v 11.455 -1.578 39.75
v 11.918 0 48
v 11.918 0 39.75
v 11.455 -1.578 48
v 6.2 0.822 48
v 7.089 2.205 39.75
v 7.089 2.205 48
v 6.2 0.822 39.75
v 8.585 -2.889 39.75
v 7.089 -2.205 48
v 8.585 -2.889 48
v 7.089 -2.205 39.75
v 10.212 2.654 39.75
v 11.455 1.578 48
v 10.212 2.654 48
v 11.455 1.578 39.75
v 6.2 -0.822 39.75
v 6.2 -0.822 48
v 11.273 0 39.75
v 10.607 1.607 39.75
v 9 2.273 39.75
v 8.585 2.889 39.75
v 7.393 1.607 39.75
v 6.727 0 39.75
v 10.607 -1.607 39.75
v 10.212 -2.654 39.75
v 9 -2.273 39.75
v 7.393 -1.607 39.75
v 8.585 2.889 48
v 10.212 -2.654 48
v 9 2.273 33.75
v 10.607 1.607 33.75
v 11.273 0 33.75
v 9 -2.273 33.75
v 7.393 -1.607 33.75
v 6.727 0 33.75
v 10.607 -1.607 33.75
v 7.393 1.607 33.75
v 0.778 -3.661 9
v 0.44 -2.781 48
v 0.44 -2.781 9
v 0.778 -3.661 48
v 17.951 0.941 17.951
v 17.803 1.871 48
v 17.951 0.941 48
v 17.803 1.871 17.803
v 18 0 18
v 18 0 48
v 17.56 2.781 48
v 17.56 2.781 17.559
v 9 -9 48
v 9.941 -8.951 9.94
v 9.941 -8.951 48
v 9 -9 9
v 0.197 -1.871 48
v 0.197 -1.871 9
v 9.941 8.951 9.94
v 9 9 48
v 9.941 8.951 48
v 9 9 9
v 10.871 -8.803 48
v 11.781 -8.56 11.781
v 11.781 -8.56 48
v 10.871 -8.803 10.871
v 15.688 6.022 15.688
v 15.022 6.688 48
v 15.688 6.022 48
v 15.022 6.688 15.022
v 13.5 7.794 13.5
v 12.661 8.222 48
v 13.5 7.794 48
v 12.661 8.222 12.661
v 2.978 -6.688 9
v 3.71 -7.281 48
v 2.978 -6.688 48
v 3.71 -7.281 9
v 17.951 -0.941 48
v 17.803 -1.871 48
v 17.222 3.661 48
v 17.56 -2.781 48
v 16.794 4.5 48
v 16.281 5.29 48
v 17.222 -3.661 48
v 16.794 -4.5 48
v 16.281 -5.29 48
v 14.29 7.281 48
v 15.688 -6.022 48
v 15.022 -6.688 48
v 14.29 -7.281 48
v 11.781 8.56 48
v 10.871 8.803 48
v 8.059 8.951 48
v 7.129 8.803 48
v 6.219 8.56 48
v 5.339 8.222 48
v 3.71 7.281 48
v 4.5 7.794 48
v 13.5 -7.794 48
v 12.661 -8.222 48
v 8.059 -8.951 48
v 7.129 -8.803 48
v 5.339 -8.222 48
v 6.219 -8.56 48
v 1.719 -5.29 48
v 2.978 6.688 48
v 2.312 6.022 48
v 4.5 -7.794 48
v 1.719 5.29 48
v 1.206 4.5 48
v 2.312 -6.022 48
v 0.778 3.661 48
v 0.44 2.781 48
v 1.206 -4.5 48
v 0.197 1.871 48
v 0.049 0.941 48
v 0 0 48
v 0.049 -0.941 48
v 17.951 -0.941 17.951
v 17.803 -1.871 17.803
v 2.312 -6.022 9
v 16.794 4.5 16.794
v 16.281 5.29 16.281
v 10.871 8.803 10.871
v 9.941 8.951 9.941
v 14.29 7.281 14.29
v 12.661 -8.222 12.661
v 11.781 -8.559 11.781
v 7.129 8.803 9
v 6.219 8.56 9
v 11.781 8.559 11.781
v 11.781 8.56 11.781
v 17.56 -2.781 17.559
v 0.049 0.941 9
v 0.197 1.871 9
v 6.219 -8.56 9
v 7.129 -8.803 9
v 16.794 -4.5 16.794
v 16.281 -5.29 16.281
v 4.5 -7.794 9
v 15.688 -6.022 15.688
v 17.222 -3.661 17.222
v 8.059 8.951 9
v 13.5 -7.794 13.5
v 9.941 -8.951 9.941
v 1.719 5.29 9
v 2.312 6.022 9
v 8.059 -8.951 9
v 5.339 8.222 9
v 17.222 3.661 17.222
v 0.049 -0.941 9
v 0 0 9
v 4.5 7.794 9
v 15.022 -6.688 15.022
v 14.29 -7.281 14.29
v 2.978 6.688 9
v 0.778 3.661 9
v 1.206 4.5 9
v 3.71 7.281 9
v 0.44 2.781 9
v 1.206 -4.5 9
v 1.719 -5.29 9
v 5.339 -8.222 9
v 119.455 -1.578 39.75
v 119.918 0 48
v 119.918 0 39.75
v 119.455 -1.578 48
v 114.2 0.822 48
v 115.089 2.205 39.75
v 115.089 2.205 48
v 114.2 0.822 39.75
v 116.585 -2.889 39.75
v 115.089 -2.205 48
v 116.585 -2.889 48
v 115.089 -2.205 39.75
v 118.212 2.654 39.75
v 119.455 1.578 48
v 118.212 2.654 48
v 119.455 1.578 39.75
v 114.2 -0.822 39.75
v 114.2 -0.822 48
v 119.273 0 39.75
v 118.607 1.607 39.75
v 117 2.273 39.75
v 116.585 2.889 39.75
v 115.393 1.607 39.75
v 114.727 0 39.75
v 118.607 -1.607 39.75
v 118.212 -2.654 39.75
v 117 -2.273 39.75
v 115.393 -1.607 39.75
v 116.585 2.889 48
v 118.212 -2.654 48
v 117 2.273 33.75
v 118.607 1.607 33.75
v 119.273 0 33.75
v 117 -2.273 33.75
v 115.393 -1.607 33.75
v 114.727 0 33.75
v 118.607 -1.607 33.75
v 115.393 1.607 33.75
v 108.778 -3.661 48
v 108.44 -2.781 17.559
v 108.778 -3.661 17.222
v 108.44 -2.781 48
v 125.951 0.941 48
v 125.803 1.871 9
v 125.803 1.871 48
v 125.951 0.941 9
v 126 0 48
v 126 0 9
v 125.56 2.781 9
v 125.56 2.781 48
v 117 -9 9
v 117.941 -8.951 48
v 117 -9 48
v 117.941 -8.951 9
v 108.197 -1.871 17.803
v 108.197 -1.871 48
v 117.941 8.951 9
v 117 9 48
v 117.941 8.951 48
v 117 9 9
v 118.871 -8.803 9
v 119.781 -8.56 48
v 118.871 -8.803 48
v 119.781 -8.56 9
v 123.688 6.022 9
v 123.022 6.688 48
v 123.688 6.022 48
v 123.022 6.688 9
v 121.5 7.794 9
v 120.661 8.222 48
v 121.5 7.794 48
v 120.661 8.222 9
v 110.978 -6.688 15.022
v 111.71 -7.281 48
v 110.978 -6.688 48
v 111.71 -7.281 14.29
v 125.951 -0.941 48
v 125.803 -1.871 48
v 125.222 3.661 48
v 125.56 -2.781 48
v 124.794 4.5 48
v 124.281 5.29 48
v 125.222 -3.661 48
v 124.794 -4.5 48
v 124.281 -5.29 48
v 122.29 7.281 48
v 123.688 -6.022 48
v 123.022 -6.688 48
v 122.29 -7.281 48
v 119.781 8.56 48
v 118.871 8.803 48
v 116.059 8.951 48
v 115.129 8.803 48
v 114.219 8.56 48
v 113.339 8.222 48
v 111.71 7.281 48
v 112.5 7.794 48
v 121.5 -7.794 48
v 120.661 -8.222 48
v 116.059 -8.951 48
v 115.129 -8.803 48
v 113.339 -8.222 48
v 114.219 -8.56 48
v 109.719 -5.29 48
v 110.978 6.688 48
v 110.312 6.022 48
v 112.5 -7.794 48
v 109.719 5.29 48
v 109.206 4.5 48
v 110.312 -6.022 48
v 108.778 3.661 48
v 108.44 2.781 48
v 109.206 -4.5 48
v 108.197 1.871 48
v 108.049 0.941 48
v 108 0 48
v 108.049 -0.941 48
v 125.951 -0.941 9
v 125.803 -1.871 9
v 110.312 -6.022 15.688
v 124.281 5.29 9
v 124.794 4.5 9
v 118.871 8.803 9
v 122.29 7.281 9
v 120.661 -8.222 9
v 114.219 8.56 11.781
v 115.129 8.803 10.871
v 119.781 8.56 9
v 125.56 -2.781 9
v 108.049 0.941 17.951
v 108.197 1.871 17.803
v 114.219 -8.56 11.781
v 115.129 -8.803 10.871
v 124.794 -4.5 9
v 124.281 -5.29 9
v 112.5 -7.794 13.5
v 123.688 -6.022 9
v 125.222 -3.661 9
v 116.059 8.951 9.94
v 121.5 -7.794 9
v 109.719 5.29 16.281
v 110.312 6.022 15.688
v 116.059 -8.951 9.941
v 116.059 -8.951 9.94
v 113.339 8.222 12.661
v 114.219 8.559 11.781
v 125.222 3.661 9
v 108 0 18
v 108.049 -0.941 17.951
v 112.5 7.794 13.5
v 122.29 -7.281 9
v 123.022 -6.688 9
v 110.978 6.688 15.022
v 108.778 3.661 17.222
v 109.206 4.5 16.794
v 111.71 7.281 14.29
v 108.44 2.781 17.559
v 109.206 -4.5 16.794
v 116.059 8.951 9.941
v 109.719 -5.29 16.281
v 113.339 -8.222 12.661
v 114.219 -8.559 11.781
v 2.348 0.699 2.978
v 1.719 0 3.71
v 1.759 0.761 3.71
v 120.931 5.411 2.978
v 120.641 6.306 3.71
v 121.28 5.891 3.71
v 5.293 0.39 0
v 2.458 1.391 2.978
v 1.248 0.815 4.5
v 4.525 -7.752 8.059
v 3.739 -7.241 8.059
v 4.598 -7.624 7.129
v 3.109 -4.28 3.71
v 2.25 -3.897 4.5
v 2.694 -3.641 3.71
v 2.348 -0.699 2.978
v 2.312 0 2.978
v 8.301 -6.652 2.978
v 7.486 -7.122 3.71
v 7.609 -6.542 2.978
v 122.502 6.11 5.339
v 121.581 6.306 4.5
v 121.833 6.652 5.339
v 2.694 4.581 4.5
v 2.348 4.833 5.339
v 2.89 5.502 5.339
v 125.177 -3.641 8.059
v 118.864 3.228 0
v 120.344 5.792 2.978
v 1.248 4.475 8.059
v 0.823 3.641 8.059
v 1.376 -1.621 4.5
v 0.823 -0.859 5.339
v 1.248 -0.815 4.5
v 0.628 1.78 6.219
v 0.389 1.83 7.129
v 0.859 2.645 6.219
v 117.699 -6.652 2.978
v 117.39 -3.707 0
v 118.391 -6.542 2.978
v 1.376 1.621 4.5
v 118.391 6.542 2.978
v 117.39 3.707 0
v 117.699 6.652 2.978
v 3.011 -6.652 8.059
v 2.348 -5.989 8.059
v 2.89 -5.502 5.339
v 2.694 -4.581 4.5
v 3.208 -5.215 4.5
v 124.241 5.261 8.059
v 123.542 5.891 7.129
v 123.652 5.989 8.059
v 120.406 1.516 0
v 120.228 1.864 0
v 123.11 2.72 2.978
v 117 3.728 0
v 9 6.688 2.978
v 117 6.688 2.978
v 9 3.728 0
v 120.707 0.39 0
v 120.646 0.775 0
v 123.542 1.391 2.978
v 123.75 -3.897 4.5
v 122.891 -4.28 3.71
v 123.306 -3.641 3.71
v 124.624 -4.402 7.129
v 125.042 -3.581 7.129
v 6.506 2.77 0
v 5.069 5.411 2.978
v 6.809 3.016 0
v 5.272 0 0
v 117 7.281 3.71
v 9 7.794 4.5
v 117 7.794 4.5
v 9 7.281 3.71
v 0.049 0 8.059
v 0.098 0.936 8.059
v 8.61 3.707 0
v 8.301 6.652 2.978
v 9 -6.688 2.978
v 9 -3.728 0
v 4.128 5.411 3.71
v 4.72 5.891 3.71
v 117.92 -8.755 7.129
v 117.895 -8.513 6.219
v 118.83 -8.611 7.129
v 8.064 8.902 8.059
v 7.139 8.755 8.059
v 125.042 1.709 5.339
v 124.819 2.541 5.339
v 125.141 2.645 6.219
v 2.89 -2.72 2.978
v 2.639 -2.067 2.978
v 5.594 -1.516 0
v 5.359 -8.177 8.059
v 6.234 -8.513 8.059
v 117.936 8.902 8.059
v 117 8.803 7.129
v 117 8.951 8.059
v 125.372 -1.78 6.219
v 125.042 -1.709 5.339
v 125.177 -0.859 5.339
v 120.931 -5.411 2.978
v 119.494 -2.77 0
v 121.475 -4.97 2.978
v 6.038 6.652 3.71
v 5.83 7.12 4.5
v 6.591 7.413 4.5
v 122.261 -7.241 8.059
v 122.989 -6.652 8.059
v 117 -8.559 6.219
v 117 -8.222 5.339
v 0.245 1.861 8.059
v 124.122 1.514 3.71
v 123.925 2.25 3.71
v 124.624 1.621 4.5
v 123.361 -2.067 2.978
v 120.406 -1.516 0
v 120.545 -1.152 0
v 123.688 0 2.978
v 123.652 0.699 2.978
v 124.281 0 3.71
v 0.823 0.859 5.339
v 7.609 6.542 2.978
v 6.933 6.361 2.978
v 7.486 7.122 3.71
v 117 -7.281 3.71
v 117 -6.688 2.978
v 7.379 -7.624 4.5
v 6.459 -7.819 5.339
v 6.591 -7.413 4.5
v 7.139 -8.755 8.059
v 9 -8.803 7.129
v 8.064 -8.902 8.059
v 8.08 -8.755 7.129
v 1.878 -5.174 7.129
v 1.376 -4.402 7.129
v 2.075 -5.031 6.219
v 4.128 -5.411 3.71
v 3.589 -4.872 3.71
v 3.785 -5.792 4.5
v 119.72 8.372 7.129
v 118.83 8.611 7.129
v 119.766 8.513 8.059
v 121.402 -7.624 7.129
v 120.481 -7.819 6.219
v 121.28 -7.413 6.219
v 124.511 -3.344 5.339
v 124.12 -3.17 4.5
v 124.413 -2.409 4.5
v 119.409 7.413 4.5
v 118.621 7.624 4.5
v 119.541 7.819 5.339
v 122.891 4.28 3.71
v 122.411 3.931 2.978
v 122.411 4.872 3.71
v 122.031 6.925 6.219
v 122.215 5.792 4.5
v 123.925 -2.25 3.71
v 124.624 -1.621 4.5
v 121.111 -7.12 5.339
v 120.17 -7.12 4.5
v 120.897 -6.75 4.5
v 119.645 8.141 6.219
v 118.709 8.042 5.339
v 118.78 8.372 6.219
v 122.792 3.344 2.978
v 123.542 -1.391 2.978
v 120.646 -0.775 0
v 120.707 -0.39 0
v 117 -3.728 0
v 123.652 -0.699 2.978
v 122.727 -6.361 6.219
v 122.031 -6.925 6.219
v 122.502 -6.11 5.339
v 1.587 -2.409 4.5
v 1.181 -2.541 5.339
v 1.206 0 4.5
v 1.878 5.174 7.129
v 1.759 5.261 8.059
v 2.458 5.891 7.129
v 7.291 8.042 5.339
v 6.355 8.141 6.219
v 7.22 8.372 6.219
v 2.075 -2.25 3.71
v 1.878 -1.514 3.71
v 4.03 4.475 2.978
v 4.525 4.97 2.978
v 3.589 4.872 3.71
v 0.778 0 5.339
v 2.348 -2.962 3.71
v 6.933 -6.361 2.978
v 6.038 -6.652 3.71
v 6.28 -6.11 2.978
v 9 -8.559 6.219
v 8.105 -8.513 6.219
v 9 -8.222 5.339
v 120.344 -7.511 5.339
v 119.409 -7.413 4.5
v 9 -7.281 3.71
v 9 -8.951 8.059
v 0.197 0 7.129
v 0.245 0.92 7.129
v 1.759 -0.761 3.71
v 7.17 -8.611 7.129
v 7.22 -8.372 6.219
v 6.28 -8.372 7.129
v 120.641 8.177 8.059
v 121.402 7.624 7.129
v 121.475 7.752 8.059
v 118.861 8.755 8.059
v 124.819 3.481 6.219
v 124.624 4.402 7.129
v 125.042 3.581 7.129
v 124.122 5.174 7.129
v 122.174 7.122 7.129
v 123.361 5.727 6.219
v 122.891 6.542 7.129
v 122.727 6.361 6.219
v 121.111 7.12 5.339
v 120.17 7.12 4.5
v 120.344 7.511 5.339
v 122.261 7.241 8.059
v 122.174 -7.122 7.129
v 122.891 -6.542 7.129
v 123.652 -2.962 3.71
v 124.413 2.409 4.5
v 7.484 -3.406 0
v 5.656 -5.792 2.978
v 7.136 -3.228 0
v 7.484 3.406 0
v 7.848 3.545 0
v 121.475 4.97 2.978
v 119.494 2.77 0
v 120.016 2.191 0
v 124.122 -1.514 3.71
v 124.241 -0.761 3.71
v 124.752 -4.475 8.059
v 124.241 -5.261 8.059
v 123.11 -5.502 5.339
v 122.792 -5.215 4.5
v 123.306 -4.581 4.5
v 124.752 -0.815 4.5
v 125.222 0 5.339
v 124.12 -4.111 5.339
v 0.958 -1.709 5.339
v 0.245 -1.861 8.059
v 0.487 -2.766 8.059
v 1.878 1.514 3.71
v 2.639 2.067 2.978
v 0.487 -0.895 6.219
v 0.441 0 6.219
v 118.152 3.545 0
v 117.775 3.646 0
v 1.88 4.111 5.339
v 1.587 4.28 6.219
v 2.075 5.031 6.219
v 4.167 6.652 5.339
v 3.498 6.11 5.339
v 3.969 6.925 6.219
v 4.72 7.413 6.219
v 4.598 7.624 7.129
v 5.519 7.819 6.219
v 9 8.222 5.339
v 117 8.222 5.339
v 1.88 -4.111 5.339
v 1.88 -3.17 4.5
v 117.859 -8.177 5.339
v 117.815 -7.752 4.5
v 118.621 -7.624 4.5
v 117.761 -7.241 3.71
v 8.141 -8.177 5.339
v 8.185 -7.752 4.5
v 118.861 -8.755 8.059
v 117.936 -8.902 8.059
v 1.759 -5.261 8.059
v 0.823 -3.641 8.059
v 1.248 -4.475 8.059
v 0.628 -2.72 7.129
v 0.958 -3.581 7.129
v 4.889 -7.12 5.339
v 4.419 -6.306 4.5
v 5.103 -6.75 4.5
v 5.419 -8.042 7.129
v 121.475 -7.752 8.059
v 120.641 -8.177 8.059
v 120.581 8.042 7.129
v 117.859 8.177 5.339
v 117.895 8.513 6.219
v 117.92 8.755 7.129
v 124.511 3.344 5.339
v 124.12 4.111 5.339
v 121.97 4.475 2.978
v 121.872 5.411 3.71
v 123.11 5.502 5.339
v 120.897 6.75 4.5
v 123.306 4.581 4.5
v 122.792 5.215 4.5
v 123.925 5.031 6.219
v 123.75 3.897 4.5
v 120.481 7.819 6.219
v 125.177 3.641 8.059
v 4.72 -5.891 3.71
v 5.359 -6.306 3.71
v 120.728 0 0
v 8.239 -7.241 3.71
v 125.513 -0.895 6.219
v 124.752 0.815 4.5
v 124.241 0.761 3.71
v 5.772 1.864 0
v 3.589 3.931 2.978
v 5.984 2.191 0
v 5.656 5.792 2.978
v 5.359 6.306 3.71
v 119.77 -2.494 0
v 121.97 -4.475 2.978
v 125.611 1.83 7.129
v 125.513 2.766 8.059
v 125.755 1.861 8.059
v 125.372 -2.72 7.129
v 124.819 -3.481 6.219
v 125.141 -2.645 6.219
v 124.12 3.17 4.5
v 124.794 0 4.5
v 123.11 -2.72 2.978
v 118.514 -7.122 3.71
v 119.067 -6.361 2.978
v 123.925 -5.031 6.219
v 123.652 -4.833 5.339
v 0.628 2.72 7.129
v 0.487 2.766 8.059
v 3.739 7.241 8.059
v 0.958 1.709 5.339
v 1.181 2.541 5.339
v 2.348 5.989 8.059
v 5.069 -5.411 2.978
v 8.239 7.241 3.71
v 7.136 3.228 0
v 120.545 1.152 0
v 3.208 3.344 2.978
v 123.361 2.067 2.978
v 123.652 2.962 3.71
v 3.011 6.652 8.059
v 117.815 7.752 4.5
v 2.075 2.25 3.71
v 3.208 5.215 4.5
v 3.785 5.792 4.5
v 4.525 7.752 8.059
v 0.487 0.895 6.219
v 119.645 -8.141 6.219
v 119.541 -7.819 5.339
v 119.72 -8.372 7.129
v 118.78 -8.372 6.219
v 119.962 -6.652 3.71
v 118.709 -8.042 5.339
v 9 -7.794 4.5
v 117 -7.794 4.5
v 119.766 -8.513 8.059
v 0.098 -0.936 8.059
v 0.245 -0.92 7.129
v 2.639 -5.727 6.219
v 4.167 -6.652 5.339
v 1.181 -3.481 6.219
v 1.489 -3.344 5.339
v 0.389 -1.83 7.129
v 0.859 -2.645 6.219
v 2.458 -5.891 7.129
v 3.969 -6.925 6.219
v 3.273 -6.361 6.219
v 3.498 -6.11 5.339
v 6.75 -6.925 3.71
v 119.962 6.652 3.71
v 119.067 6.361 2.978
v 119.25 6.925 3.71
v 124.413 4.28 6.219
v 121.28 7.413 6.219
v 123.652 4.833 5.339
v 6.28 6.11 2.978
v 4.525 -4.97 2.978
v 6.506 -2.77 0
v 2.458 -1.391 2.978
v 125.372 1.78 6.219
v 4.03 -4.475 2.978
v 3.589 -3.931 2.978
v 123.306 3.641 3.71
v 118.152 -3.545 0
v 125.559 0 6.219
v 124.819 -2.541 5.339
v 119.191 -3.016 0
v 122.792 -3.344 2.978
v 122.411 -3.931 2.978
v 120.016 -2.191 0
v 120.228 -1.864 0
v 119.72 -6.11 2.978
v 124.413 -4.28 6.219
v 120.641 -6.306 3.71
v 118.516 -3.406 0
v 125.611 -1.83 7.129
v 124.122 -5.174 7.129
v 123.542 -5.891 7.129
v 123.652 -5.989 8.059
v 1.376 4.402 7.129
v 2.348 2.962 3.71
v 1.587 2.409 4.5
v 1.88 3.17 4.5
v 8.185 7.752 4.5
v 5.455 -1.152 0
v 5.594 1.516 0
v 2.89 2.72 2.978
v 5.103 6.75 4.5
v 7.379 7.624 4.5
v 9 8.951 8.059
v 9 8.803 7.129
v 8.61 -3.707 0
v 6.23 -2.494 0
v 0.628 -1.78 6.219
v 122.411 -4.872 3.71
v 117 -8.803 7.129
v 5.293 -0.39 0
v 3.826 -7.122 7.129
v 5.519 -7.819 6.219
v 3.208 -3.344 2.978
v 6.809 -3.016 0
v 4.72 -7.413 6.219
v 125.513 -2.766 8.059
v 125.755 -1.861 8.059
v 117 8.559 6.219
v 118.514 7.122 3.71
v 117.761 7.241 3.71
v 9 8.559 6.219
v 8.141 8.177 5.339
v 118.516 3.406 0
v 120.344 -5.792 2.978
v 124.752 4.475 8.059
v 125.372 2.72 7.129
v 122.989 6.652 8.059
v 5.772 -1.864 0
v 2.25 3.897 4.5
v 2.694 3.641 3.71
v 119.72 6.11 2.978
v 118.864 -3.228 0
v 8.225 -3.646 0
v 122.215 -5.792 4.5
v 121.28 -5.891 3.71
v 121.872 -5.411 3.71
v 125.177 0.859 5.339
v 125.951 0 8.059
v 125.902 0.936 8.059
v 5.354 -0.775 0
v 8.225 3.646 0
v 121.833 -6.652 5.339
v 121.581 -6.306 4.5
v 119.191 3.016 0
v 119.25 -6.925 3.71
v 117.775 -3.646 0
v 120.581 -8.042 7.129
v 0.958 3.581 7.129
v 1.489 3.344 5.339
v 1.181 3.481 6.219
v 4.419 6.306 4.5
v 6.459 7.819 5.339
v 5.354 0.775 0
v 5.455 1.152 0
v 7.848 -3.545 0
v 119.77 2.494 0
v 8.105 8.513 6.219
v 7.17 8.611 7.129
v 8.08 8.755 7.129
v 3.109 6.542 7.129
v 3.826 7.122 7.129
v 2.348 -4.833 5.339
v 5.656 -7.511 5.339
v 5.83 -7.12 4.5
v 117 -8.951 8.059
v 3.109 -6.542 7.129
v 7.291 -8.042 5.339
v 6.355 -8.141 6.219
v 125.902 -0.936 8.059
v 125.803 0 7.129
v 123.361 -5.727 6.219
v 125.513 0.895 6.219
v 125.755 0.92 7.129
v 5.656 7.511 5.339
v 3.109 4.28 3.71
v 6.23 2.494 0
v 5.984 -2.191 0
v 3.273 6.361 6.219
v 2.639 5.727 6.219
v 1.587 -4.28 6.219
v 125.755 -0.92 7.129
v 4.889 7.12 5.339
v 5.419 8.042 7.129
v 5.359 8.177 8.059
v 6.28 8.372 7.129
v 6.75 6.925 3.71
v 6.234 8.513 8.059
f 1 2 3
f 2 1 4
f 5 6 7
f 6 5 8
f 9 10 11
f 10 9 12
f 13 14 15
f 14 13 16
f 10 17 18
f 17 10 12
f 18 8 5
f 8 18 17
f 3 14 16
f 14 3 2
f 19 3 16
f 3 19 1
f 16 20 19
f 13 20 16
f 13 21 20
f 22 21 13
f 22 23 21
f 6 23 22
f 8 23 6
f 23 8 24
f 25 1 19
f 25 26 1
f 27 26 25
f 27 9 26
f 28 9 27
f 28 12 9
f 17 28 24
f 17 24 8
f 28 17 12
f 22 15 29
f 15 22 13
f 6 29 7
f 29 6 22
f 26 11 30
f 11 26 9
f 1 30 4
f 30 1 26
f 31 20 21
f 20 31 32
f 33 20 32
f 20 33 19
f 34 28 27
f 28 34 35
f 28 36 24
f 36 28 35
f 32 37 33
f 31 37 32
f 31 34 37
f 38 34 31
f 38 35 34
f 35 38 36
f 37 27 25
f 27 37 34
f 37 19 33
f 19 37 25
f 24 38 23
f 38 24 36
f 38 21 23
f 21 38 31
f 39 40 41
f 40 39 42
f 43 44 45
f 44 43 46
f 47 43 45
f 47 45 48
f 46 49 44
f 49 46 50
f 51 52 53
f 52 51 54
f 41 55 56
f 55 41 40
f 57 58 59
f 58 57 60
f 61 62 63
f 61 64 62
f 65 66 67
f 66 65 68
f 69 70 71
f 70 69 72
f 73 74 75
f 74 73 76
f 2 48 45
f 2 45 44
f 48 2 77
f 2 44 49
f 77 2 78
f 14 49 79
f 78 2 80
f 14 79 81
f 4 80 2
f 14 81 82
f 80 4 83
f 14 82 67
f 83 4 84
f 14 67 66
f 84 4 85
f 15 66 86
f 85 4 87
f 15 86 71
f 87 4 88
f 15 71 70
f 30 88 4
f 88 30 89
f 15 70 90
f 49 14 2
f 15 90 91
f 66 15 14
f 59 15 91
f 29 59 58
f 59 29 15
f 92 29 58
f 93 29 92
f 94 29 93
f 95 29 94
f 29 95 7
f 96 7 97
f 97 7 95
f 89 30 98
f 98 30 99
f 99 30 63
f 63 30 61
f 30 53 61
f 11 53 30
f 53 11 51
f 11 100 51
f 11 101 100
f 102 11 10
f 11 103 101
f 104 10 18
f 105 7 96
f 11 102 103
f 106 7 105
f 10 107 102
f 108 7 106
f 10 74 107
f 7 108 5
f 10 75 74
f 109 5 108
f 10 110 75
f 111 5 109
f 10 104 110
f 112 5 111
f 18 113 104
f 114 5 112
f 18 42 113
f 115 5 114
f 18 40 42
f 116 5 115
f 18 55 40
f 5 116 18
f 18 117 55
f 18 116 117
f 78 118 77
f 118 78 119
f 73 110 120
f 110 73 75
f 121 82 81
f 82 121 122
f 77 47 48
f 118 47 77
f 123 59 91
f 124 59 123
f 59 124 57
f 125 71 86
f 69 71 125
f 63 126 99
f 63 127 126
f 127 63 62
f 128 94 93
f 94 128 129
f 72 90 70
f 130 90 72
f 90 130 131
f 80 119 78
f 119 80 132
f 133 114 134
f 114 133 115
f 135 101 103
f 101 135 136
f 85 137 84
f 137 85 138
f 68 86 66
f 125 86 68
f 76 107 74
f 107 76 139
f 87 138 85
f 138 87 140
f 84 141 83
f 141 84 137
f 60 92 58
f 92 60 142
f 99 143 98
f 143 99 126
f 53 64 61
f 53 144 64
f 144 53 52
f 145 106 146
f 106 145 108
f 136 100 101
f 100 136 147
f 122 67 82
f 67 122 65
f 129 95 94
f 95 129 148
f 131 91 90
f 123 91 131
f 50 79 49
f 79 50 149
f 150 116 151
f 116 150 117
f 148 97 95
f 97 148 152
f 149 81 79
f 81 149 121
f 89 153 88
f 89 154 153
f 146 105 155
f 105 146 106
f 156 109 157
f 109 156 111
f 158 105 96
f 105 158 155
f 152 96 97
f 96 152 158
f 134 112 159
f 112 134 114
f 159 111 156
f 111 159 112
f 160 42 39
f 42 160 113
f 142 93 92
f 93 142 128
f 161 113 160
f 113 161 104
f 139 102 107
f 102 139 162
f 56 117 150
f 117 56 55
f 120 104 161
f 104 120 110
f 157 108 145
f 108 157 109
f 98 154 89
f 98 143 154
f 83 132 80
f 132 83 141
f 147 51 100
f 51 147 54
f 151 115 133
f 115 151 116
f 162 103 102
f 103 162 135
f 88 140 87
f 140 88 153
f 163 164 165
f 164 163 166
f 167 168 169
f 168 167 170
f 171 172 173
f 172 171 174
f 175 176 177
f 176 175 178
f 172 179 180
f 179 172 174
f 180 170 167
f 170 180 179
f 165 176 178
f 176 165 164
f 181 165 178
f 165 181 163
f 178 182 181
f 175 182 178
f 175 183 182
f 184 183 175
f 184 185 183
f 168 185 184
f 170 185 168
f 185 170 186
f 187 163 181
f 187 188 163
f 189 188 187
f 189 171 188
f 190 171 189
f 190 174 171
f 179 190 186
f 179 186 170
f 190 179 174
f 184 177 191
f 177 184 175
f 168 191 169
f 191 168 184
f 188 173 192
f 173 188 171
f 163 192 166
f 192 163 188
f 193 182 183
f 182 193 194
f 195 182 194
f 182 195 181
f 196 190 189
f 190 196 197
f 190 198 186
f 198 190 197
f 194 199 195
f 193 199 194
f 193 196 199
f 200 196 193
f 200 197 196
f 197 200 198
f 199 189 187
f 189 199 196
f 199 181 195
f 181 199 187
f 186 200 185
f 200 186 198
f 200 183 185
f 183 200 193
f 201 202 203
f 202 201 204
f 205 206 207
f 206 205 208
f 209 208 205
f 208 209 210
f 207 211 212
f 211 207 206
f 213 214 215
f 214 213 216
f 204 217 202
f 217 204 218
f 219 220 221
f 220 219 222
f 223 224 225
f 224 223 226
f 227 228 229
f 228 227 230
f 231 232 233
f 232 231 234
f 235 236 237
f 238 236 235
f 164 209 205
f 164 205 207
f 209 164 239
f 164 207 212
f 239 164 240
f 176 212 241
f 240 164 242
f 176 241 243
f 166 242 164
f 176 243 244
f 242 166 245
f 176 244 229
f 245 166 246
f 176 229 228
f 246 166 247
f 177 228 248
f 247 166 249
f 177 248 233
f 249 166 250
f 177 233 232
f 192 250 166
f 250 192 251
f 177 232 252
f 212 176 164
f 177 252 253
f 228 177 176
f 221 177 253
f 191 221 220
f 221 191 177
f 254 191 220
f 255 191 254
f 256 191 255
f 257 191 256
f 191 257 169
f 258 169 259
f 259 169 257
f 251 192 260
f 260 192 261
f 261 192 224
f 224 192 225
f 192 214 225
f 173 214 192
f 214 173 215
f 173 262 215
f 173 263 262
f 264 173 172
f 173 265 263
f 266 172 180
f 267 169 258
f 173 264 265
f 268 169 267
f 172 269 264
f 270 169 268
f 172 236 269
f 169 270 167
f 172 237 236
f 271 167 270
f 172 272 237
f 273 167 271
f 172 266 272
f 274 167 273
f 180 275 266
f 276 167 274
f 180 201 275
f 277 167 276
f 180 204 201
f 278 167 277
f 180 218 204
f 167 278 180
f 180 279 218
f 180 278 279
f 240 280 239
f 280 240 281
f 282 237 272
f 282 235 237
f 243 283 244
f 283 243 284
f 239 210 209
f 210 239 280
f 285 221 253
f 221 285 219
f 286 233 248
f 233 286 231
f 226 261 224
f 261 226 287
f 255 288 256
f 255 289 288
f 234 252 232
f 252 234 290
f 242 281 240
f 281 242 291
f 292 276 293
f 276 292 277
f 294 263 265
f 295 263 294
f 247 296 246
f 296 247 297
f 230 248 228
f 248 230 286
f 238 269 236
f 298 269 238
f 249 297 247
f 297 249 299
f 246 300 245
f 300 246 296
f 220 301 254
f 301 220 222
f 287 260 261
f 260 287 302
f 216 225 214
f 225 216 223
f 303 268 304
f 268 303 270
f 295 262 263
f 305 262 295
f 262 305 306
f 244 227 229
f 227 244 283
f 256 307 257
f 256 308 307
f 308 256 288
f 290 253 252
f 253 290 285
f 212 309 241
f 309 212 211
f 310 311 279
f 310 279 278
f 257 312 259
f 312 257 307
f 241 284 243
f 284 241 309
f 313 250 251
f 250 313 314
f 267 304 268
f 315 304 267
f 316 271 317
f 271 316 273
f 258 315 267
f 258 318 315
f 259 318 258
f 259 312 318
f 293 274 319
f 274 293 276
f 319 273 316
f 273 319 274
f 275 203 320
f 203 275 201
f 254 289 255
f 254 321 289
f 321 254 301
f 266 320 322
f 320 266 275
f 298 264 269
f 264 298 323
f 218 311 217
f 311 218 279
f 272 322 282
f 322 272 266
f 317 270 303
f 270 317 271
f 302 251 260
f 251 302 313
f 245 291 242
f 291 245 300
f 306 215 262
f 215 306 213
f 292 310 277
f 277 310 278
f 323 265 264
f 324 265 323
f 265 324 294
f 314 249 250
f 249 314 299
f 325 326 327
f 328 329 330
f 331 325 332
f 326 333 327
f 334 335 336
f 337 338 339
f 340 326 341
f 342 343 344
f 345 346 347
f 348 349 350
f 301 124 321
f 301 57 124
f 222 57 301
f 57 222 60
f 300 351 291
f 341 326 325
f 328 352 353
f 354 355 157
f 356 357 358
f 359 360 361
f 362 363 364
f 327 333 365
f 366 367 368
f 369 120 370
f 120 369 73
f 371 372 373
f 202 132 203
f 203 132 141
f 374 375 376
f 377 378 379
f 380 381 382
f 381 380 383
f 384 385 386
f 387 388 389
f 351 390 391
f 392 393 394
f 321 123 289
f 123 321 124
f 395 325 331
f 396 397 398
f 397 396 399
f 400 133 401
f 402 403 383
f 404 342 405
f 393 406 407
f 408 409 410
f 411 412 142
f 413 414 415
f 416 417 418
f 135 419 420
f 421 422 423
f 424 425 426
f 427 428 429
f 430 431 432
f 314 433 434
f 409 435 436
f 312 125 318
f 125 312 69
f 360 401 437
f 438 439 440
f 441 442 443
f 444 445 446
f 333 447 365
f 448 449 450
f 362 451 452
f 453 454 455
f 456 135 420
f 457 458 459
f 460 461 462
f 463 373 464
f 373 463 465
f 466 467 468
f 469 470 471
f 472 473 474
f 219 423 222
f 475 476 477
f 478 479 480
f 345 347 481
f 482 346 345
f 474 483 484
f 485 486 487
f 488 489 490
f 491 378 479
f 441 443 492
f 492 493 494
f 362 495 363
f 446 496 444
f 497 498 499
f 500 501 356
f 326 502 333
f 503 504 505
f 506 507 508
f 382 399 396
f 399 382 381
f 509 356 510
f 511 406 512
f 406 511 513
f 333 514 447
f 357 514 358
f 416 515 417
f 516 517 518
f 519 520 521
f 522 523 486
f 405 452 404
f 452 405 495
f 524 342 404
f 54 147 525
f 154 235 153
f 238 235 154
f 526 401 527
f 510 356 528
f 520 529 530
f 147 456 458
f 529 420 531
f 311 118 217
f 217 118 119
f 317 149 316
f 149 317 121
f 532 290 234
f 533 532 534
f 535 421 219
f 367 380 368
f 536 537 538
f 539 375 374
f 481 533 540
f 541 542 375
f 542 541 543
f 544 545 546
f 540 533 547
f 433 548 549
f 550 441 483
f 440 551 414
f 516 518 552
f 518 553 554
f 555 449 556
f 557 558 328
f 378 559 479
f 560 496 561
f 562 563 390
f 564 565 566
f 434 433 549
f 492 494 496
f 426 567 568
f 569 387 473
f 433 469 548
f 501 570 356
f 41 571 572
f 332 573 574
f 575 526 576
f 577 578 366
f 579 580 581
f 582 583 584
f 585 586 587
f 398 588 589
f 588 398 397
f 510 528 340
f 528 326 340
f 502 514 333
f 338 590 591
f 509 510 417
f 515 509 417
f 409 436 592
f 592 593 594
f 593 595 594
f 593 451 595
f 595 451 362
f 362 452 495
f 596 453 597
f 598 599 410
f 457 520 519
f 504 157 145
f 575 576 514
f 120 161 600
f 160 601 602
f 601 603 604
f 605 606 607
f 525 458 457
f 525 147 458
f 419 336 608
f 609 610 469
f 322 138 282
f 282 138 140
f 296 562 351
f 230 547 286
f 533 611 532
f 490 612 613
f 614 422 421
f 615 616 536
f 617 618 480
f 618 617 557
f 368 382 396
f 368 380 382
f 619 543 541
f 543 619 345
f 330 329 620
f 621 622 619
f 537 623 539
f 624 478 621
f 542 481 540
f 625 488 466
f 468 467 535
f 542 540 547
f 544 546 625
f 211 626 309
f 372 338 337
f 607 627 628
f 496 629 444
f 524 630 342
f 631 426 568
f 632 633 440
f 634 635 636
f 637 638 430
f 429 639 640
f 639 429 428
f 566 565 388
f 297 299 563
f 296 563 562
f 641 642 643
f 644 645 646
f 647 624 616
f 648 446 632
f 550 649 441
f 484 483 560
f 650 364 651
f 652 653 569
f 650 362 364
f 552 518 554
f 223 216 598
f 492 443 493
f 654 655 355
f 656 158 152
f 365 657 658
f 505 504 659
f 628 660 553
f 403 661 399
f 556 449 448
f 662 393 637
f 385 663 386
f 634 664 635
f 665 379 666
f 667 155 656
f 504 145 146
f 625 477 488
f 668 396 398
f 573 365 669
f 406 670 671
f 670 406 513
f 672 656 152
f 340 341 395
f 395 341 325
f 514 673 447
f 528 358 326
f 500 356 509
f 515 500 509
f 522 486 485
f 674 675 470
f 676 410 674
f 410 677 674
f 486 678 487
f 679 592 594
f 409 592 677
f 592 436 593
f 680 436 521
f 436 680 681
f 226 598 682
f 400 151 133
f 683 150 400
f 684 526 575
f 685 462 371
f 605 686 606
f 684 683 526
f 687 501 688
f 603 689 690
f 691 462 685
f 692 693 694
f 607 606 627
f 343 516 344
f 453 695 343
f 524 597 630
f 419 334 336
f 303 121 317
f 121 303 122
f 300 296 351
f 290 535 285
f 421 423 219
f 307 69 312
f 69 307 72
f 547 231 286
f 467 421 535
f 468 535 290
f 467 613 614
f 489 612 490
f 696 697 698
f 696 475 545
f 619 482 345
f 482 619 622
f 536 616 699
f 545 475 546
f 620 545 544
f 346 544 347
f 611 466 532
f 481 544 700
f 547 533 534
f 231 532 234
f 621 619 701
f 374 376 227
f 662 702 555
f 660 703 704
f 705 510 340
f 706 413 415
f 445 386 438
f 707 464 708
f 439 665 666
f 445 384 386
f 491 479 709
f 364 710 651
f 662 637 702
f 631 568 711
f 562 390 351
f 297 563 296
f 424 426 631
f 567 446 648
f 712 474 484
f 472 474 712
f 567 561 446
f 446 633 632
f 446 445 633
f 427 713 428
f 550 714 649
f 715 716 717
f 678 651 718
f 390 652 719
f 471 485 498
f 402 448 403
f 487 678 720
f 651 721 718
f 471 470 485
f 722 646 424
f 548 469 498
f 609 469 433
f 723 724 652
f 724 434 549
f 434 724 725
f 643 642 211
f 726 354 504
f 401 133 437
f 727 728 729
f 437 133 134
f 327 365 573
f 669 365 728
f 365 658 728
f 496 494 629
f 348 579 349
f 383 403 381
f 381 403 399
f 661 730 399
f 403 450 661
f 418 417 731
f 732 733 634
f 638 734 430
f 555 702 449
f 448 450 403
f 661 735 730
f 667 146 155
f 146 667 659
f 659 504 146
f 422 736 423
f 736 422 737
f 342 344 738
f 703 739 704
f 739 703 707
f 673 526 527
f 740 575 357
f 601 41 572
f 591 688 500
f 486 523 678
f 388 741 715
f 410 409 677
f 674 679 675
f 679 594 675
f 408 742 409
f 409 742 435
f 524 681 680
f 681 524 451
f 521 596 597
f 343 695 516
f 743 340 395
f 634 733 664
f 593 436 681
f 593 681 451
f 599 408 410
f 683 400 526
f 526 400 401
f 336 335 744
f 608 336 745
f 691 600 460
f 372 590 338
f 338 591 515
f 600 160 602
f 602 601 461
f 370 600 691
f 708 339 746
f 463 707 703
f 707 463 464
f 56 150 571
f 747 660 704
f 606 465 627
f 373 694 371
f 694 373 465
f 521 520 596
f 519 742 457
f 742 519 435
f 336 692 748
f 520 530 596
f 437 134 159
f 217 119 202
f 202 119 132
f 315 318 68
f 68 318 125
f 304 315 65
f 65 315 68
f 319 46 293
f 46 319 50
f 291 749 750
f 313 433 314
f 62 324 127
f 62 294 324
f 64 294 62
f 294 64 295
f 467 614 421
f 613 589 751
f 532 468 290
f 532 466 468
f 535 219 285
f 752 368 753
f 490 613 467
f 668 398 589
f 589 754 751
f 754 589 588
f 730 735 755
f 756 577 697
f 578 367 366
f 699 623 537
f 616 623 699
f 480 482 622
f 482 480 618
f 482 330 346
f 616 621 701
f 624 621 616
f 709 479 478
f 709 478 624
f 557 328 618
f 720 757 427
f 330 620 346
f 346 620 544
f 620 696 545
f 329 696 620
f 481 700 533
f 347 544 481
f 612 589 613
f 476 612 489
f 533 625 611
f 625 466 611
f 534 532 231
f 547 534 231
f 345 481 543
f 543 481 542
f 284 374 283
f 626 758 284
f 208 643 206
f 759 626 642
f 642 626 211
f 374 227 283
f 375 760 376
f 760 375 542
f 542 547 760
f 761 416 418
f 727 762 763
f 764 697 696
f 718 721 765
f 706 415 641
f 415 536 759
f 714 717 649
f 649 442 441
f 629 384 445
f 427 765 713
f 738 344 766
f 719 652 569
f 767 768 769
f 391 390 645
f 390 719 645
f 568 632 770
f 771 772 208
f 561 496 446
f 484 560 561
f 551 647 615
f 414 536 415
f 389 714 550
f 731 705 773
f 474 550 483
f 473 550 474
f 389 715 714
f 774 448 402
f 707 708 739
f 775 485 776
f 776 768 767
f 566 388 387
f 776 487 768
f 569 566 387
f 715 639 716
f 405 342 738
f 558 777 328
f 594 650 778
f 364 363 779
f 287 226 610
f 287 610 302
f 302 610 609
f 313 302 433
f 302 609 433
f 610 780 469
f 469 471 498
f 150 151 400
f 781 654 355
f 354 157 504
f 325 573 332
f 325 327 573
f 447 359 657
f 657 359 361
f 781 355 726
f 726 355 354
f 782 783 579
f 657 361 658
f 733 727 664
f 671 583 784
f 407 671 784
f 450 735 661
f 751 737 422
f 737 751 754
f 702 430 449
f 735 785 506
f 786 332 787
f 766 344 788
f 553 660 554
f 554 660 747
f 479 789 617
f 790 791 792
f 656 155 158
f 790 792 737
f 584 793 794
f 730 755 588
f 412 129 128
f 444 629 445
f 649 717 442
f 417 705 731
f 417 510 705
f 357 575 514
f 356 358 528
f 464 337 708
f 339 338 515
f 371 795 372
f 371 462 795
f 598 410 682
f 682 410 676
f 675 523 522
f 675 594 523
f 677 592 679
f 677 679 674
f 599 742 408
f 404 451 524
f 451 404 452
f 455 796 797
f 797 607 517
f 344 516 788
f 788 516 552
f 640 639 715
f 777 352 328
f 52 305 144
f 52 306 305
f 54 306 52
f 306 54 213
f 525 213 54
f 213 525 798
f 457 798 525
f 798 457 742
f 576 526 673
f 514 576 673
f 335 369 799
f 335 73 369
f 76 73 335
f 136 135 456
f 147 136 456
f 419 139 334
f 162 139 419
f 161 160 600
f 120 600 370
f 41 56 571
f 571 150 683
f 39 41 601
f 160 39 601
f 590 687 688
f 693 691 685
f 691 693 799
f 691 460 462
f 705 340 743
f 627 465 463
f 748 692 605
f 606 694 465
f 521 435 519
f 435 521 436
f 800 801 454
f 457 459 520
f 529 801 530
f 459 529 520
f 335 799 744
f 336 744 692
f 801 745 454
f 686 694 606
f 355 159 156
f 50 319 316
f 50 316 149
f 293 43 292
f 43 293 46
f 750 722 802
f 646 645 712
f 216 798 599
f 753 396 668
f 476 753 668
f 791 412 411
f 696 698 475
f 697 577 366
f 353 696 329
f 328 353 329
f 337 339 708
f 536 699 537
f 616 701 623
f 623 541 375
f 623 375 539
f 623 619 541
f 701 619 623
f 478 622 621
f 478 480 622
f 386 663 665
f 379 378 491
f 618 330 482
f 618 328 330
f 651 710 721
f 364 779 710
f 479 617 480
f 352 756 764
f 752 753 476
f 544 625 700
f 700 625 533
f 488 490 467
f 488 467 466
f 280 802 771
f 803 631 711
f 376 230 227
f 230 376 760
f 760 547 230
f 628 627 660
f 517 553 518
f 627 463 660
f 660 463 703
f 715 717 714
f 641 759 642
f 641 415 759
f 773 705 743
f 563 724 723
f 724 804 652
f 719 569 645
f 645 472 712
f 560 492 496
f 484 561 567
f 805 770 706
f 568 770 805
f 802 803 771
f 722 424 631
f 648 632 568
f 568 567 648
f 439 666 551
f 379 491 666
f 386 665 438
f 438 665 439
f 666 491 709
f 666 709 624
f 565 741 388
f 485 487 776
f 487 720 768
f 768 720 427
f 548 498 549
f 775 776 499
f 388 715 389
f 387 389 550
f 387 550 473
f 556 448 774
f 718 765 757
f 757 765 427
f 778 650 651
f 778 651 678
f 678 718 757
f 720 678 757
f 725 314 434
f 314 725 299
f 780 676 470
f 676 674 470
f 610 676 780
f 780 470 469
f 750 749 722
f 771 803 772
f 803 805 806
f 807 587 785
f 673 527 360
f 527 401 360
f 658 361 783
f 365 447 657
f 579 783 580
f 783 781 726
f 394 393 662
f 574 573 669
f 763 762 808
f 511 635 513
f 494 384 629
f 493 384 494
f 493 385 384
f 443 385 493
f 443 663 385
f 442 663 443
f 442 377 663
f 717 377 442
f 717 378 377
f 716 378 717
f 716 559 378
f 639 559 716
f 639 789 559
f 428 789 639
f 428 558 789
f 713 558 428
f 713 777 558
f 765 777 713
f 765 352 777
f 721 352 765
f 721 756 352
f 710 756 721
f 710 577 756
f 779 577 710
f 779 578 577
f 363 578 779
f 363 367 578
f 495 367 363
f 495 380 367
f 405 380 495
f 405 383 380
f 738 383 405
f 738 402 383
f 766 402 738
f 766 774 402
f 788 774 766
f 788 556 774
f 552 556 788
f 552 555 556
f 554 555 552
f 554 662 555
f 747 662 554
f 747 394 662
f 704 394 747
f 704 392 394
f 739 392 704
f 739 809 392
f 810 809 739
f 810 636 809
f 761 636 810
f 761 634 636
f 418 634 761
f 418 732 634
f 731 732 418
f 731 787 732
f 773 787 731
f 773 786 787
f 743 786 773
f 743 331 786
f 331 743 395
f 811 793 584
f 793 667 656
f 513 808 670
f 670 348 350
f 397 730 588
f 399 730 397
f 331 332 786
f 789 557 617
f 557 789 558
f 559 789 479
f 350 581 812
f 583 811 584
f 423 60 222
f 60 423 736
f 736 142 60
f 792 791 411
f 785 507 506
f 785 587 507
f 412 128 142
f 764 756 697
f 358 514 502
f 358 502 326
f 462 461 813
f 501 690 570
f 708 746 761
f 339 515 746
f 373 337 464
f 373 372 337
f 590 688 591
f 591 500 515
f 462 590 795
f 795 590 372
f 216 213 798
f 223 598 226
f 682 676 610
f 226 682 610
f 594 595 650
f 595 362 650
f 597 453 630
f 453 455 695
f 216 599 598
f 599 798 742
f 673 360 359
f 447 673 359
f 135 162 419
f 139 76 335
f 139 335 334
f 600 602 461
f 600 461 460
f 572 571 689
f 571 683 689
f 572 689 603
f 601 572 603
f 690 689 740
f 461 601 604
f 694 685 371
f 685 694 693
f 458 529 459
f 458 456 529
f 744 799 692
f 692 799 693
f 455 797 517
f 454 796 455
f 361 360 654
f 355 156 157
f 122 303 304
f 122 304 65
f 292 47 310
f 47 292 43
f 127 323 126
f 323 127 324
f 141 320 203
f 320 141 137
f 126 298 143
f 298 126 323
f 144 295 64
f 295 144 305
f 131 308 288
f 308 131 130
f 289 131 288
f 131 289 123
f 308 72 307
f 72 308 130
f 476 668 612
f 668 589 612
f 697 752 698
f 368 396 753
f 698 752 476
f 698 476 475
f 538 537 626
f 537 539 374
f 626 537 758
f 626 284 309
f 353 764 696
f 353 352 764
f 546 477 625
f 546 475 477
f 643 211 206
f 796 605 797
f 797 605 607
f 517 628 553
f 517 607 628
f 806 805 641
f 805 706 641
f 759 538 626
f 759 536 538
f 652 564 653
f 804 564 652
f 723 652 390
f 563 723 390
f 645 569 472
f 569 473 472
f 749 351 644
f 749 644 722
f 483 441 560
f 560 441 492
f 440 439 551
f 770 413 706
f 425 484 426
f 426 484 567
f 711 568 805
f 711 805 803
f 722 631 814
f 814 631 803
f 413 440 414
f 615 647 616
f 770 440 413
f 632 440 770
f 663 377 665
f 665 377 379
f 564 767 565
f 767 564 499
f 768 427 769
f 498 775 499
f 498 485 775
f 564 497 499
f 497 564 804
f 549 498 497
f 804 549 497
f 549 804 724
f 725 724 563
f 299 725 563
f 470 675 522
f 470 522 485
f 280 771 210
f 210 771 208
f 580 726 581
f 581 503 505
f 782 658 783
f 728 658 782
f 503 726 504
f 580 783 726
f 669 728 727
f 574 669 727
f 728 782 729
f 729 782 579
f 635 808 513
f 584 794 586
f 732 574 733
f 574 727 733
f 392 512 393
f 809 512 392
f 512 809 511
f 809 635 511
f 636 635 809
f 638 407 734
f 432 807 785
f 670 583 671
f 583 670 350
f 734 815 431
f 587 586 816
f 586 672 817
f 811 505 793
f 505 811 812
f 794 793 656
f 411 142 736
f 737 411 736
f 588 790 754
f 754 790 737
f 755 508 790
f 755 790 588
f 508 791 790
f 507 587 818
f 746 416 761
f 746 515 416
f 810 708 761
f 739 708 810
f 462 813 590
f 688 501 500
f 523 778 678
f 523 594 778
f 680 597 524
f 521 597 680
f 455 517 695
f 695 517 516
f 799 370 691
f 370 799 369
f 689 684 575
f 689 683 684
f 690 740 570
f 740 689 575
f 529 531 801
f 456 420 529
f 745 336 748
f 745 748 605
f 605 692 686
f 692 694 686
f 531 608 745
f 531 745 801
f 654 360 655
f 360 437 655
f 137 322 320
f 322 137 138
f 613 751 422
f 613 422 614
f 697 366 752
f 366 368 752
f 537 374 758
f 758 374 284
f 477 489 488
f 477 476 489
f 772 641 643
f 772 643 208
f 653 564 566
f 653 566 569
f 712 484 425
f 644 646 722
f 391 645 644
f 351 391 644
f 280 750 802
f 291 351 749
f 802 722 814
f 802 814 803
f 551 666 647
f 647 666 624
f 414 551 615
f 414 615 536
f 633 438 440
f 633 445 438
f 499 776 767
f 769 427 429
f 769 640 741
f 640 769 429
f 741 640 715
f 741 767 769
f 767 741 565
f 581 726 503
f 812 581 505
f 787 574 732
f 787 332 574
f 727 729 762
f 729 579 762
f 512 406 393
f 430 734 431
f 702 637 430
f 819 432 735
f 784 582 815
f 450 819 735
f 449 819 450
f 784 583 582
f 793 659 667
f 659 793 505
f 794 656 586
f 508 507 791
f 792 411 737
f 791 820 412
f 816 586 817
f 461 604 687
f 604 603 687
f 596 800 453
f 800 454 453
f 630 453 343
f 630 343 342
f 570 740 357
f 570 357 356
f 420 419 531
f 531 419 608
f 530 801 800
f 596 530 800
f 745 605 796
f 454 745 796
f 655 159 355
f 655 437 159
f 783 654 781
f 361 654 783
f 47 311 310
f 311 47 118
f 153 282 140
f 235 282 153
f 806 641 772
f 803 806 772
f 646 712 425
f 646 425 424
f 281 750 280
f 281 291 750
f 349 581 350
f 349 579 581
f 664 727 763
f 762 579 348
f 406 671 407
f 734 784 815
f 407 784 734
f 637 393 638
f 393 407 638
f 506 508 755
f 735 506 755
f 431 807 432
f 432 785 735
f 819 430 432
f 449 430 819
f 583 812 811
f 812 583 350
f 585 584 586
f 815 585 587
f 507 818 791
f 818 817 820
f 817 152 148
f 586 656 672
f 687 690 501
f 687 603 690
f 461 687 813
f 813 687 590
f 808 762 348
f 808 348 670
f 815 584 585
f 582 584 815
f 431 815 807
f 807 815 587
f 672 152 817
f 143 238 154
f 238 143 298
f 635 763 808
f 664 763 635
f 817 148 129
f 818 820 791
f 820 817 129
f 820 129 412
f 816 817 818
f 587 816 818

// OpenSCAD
//
// NopSCADlib Copyright Chris Palmer 2018
// nop.head@gmail.com
// hydraraptor.blogspot.com
//
// This file is part of NopSCADlib.
//
// NopSCADlib is free software: you can redistribute it and/or modify it under the terms of the
// GNU General Public License as published by the Free Software Foundation, either version 3 of
// the License, or (at your option) any later version.
//
// NopSCADlib is distributed in the hope that it will be useful, but WITHOUT ANY WARRANTY;
// without even the implied warranty of MERCHANTABILITY or FITNESS FOR A PARTICULAR PURPOSE.
// See the GNU General Public License for more details.
//
// You should have received a copy of the GNU General Public License along with NopSCADlib.
// If not, see <https://www.gnu.org/licenses/>.
//
include <../core.scad>
use <../handle.scad>

module handle()
    translate([handle_length() / 2, 0])
        if($preview)
            handle_fastened_assembly(3);
        else
            handle_stl();

handle();
